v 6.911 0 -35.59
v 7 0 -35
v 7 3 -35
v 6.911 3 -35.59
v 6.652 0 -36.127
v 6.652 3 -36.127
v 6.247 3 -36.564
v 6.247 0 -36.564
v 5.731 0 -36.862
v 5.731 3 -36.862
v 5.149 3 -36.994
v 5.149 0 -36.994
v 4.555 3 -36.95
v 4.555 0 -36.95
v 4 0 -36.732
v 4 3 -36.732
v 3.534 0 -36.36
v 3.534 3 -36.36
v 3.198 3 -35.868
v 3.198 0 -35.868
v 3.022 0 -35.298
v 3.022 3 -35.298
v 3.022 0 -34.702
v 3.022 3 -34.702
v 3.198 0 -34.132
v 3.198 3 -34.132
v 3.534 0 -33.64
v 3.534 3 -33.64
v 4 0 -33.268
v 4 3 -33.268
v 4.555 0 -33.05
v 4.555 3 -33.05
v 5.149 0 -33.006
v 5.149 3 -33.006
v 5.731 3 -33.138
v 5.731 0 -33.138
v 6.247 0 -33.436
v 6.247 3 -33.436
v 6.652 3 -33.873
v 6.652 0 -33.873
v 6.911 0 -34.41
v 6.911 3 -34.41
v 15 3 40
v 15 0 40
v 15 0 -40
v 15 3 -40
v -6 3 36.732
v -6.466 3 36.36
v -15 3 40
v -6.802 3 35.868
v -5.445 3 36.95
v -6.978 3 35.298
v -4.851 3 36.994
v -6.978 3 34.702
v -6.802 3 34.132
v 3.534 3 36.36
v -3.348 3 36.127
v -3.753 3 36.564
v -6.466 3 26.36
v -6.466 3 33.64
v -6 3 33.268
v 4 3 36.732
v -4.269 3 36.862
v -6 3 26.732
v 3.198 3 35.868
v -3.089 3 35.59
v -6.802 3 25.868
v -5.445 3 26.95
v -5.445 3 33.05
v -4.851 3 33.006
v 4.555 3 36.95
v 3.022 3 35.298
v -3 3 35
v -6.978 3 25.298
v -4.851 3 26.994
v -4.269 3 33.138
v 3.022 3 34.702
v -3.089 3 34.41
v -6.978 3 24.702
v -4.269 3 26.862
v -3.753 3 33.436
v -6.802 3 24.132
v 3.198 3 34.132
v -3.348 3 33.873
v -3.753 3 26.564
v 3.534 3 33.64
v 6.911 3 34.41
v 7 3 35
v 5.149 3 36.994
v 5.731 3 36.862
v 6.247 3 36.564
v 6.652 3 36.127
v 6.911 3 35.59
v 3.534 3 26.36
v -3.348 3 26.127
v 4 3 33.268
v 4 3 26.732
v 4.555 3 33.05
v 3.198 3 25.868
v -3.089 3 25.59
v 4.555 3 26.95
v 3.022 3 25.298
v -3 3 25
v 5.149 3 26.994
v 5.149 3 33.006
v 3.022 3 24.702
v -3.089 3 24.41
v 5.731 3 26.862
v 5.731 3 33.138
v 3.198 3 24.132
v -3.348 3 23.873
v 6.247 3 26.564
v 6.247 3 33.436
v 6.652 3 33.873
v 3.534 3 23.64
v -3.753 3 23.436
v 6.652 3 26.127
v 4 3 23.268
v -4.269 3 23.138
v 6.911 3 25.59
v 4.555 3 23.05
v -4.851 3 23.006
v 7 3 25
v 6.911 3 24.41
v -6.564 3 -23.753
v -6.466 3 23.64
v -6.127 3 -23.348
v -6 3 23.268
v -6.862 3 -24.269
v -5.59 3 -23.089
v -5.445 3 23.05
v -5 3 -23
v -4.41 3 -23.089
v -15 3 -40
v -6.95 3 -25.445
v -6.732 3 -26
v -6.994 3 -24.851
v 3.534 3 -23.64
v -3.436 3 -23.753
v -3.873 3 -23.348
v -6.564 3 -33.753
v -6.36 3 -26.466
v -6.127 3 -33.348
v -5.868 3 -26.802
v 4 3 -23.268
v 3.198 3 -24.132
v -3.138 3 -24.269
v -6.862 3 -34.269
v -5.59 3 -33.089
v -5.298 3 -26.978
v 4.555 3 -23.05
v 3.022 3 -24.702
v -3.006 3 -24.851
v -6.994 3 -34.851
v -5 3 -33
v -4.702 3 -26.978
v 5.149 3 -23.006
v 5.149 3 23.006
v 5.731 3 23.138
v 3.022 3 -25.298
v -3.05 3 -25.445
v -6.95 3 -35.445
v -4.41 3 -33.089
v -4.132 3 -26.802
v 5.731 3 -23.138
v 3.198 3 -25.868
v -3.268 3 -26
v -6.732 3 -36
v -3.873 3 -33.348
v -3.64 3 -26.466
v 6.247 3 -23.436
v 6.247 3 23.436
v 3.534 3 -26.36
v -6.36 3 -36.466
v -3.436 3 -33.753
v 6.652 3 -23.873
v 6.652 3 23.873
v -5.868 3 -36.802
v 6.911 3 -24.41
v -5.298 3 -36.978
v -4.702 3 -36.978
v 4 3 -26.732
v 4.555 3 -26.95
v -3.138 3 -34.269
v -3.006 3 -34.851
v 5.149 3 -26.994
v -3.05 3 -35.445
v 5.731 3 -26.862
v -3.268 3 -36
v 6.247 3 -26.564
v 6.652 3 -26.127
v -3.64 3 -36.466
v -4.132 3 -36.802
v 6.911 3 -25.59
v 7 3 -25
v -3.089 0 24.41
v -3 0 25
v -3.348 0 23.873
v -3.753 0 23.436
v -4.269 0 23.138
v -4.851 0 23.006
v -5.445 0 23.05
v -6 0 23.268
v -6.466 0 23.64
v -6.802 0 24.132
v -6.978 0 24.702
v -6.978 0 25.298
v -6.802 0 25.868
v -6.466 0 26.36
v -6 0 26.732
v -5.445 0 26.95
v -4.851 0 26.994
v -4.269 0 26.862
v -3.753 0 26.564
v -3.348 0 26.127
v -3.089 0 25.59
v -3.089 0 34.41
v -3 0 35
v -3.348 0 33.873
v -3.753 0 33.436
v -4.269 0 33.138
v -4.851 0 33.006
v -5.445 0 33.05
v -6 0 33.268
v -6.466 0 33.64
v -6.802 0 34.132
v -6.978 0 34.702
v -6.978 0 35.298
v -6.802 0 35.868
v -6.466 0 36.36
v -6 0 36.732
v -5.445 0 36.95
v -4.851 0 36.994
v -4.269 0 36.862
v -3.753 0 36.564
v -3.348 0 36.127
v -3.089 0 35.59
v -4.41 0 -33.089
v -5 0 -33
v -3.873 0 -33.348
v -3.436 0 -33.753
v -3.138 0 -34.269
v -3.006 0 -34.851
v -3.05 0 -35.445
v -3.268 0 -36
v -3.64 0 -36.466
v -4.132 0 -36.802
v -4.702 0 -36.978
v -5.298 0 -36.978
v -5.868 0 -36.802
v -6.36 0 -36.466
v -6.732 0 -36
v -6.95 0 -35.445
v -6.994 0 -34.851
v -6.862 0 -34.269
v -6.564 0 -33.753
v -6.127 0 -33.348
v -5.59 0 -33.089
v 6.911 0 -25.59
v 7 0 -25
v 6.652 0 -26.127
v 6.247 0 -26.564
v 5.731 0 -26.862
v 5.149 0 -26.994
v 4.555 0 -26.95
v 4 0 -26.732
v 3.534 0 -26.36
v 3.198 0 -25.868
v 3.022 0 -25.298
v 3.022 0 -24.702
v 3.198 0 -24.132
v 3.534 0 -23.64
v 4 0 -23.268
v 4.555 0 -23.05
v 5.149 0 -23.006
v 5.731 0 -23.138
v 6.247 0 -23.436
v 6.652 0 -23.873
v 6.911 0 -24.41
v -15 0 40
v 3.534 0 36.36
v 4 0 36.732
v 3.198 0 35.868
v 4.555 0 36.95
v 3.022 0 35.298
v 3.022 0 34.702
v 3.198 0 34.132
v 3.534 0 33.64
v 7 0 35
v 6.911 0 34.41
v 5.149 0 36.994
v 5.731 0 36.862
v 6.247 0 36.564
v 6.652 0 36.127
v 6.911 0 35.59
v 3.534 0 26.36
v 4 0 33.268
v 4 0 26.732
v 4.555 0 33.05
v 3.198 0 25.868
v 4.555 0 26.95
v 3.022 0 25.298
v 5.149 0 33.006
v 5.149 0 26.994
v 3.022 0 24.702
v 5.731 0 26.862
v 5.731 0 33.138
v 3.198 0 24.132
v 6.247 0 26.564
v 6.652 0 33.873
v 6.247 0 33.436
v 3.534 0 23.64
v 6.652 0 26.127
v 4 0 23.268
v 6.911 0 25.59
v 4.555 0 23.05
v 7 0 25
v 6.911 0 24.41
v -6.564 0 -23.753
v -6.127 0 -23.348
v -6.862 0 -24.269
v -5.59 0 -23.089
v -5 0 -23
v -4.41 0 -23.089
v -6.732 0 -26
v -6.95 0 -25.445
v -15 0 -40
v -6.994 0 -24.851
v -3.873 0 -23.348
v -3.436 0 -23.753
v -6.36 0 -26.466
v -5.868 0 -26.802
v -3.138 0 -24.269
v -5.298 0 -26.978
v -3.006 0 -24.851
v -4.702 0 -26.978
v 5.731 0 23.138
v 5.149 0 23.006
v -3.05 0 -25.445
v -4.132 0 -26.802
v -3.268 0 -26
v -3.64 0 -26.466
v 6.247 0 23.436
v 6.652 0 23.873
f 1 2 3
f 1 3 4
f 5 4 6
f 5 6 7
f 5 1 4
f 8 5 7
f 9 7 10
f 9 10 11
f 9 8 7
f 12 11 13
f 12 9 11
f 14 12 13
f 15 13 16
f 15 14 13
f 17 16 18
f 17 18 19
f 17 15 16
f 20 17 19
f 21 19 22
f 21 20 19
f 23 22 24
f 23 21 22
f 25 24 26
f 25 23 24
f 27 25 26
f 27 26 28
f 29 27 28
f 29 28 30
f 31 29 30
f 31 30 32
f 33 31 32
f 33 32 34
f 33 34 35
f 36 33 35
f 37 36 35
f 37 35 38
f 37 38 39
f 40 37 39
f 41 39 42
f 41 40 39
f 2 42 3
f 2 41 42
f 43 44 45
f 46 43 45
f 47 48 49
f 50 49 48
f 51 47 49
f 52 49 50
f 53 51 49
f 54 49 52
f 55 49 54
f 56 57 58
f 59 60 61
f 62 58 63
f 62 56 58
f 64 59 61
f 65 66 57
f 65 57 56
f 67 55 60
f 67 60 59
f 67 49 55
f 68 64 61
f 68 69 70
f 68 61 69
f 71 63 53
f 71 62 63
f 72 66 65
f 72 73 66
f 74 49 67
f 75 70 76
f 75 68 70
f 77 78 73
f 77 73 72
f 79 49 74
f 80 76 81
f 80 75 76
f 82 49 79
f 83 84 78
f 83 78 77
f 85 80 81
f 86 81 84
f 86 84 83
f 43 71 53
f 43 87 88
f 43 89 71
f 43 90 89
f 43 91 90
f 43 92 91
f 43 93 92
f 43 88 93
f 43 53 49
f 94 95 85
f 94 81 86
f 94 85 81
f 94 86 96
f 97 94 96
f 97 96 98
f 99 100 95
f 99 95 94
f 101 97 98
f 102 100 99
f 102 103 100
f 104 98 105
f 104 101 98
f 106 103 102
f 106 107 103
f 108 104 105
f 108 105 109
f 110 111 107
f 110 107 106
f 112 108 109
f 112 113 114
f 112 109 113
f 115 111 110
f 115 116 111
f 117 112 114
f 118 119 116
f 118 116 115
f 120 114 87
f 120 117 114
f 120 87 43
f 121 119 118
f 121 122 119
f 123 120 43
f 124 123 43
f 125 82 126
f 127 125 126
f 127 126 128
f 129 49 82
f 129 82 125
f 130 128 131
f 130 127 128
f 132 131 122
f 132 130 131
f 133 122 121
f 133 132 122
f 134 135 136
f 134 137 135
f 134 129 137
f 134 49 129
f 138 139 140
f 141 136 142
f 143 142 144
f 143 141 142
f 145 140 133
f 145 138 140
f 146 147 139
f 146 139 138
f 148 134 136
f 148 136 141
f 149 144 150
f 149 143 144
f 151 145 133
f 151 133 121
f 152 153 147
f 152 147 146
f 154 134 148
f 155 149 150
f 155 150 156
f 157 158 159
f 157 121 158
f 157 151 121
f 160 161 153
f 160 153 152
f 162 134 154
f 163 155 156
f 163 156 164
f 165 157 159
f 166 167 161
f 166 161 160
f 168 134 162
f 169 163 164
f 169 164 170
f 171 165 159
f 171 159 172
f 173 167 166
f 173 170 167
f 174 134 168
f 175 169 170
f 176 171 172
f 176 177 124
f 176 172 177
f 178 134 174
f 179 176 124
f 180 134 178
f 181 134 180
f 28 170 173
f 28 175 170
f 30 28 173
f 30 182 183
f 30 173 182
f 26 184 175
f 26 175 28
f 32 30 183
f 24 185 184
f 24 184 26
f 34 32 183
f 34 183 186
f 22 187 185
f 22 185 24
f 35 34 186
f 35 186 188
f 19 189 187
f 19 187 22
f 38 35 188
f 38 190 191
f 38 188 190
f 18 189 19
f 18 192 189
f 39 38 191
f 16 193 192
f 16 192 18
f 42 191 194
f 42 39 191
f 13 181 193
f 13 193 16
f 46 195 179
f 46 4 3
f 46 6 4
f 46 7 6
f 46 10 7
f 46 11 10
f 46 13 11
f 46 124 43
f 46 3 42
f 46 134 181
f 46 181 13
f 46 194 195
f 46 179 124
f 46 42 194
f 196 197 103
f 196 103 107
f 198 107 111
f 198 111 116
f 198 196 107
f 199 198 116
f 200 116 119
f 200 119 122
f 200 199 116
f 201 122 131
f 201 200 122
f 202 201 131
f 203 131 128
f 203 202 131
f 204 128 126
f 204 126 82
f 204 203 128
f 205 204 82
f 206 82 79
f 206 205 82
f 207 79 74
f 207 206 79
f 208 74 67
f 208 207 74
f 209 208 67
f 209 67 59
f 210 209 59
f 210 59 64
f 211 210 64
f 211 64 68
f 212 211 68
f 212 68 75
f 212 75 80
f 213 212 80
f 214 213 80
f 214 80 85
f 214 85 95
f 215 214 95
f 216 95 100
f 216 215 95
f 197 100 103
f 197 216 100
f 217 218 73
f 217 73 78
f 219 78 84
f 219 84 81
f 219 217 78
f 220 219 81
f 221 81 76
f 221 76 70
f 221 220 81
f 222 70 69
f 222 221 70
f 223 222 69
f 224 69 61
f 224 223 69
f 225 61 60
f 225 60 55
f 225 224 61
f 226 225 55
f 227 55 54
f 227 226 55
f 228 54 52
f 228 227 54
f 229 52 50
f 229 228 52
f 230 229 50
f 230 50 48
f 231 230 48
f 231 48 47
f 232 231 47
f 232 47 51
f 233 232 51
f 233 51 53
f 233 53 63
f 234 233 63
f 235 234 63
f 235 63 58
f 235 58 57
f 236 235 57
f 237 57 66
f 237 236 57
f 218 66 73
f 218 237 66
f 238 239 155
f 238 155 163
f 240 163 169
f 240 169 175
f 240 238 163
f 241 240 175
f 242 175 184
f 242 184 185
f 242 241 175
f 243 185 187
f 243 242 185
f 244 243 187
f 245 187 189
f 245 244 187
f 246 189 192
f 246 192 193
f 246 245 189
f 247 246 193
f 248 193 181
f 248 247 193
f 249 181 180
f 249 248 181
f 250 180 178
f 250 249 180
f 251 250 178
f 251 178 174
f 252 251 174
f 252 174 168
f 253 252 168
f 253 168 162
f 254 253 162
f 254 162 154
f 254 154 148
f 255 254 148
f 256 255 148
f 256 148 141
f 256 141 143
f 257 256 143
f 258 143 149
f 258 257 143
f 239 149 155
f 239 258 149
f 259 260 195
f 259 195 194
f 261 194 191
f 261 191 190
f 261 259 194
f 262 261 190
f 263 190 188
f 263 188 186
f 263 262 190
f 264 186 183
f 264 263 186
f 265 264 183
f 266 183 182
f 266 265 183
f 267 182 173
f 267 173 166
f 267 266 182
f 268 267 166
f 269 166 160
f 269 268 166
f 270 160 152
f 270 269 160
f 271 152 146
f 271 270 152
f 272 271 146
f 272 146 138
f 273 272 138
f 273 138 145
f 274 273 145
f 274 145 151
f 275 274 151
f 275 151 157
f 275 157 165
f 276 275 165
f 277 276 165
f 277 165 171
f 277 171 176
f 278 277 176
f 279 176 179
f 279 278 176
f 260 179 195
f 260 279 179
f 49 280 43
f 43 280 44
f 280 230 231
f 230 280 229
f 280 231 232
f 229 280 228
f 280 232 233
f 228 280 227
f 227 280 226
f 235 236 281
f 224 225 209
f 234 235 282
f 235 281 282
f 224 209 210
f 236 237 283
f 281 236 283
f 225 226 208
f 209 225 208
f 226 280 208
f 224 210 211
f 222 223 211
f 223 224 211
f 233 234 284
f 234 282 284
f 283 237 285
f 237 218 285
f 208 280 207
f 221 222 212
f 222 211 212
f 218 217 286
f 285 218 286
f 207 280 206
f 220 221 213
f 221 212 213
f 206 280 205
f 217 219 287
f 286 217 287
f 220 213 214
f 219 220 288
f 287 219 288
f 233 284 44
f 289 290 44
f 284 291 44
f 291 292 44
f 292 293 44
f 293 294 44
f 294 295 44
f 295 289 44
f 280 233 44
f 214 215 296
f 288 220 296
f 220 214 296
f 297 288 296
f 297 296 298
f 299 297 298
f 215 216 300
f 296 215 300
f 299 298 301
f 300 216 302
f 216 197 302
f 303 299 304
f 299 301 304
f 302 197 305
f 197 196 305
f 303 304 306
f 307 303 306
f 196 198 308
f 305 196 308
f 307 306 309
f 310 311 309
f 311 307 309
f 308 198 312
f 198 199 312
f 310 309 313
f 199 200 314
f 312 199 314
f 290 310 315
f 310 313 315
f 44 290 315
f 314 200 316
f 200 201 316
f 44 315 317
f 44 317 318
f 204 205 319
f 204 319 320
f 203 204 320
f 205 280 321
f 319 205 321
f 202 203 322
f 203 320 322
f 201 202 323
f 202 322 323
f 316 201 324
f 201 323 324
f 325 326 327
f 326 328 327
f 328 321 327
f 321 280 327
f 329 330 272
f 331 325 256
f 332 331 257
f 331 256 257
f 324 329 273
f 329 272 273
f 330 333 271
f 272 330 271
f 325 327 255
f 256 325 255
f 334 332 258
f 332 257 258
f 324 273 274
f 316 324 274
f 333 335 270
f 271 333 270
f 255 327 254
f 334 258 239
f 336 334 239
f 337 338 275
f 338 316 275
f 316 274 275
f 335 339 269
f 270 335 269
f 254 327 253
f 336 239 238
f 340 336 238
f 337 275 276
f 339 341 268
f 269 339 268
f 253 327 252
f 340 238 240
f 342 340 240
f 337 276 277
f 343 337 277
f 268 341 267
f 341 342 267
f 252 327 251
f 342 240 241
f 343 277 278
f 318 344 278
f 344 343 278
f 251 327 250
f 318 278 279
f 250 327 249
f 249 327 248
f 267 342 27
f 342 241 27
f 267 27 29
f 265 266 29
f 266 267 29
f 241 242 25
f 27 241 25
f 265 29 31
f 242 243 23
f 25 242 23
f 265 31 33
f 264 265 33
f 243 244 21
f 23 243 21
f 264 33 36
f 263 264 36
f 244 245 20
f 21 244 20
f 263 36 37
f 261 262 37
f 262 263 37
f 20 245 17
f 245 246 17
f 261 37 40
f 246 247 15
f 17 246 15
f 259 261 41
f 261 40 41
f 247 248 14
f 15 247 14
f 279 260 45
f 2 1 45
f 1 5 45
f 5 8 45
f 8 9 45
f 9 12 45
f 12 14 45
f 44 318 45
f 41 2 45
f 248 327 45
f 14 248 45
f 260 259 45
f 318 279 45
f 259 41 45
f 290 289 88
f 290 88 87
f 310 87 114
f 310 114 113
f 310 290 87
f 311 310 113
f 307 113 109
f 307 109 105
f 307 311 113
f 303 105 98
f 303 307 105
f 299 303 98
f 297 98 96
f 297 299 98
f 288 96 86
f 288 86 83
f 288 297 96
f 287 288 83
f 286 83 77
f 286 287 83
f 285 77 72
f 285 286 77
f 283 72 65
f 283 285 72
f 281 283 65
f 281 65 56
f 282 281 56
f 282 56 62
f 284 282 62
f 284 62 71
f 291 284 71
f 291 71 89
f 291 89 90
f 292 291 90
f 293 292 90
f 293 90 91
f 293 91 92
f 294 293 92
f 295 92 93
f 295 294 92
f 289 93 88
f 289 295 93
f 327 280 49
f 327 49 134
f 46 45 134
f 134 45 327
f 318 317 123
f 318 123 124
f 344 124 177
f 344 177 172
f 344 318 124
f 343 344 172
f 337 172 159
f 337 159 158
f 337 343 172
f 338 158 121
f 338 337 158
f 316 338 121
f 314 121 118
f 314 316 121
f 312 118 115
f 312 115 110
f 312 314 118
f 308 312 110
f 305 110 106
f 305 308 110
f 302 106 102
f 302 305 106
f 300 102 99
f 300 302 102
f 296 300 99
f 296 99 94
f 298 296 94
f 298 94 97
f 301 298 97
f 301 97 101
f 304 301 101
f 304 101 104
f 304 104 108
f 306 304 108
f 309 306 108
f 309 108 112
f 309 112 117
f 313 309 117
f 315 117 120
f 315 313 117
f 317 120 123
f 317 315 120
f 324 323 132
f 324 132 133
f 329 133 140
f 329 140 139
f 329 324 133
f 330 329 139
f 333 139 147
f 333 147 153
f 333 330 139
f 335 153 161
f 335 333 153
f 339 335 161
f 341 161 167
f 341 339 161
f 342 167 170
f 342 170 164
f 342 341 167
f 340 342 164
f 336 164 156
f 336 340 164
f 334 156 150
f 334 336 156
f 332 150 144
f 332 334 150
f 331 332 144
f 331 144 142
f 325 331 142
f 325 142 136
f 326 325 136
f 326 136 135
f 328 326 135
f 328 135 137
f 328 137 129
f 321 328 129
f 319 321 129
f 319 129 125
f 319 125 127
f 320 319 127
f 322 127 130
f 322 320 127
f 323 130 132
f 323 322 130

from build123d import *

# Parameters (mm, degrees)
SKETCH2_W           = 15
SKETCH2_H           = 40
SKETCH2_R           = 2
BOSS_EXTRUDE1_DEPTH = 3
MIRROR1_OUTLINE_R   = 2
MIRROR1_DEPTH       = 3


# Read off the part's stored shape, not the designer's step: Mirror1
with BuildPart() as part:
    # Sketch2 → Boss-Extrude1 (new body)
    with BuildSketch(Plane(origin=(0, 0, 0), x_dir=(1, 0, 0), z_dir=(0, 1, 0))):
        with Locations((-7.5, 20)):
            Rectangle(SKETCH2_W, SKETCH2_H)
        with Locations(Location((-5, 35, 0), (0, 0, 270))):
            Circle(SKETCH2_R, mode=Mode.SUBTRACT)
        with Locations(Location((-5, 25, 0), (0, 0, 270))):
            Circle(SKETCH2_R, mode=Mode.SUBTRACT)
    extrude(amount=BOSS_EXTRUDE1_DEPTH)

    # Mirror1 outline → Mirror1 (add)
    with BuildSketch(Plane(origin=(0, 0, 0), x_dir=(1, 0, 0), z_dir=(0, 1, 0))):
        Polygon((15, 40), (0, 40), (0, 0), (-15, 0), (-15, -40), (15, -40), align=None)
        with Locations((-5, -35)):
            Circle(MIRROR1_OUTLINE_R, mode=Mode.SUBTRACT)
        with Locations((-5, -25)):
            Circle(MIRROR1_OUTLINE_R, mode=Mode.SUBTRACT)
        with Locations((5, -35)):
            Circle(MIRROR1_OUTLINE_R, mode=Mode.SUBTRACT)
        with Locations((5, -25)):
            Circle(MIRROR1_OUTLINE_R, mode=Mode.SUBTRACT)
        with Locations((5, 25)):
            Circle(MIRROR1_OUTLINE_R, mode=Mode.SUBTRACT)
        with Locations((5, 35)):
            Circle(MIRROR1_OUTLINE_R, mode=Mode.SUBTRACT)
    extrude(amount=MIRROR1_DEPTH)


solid = part.part
